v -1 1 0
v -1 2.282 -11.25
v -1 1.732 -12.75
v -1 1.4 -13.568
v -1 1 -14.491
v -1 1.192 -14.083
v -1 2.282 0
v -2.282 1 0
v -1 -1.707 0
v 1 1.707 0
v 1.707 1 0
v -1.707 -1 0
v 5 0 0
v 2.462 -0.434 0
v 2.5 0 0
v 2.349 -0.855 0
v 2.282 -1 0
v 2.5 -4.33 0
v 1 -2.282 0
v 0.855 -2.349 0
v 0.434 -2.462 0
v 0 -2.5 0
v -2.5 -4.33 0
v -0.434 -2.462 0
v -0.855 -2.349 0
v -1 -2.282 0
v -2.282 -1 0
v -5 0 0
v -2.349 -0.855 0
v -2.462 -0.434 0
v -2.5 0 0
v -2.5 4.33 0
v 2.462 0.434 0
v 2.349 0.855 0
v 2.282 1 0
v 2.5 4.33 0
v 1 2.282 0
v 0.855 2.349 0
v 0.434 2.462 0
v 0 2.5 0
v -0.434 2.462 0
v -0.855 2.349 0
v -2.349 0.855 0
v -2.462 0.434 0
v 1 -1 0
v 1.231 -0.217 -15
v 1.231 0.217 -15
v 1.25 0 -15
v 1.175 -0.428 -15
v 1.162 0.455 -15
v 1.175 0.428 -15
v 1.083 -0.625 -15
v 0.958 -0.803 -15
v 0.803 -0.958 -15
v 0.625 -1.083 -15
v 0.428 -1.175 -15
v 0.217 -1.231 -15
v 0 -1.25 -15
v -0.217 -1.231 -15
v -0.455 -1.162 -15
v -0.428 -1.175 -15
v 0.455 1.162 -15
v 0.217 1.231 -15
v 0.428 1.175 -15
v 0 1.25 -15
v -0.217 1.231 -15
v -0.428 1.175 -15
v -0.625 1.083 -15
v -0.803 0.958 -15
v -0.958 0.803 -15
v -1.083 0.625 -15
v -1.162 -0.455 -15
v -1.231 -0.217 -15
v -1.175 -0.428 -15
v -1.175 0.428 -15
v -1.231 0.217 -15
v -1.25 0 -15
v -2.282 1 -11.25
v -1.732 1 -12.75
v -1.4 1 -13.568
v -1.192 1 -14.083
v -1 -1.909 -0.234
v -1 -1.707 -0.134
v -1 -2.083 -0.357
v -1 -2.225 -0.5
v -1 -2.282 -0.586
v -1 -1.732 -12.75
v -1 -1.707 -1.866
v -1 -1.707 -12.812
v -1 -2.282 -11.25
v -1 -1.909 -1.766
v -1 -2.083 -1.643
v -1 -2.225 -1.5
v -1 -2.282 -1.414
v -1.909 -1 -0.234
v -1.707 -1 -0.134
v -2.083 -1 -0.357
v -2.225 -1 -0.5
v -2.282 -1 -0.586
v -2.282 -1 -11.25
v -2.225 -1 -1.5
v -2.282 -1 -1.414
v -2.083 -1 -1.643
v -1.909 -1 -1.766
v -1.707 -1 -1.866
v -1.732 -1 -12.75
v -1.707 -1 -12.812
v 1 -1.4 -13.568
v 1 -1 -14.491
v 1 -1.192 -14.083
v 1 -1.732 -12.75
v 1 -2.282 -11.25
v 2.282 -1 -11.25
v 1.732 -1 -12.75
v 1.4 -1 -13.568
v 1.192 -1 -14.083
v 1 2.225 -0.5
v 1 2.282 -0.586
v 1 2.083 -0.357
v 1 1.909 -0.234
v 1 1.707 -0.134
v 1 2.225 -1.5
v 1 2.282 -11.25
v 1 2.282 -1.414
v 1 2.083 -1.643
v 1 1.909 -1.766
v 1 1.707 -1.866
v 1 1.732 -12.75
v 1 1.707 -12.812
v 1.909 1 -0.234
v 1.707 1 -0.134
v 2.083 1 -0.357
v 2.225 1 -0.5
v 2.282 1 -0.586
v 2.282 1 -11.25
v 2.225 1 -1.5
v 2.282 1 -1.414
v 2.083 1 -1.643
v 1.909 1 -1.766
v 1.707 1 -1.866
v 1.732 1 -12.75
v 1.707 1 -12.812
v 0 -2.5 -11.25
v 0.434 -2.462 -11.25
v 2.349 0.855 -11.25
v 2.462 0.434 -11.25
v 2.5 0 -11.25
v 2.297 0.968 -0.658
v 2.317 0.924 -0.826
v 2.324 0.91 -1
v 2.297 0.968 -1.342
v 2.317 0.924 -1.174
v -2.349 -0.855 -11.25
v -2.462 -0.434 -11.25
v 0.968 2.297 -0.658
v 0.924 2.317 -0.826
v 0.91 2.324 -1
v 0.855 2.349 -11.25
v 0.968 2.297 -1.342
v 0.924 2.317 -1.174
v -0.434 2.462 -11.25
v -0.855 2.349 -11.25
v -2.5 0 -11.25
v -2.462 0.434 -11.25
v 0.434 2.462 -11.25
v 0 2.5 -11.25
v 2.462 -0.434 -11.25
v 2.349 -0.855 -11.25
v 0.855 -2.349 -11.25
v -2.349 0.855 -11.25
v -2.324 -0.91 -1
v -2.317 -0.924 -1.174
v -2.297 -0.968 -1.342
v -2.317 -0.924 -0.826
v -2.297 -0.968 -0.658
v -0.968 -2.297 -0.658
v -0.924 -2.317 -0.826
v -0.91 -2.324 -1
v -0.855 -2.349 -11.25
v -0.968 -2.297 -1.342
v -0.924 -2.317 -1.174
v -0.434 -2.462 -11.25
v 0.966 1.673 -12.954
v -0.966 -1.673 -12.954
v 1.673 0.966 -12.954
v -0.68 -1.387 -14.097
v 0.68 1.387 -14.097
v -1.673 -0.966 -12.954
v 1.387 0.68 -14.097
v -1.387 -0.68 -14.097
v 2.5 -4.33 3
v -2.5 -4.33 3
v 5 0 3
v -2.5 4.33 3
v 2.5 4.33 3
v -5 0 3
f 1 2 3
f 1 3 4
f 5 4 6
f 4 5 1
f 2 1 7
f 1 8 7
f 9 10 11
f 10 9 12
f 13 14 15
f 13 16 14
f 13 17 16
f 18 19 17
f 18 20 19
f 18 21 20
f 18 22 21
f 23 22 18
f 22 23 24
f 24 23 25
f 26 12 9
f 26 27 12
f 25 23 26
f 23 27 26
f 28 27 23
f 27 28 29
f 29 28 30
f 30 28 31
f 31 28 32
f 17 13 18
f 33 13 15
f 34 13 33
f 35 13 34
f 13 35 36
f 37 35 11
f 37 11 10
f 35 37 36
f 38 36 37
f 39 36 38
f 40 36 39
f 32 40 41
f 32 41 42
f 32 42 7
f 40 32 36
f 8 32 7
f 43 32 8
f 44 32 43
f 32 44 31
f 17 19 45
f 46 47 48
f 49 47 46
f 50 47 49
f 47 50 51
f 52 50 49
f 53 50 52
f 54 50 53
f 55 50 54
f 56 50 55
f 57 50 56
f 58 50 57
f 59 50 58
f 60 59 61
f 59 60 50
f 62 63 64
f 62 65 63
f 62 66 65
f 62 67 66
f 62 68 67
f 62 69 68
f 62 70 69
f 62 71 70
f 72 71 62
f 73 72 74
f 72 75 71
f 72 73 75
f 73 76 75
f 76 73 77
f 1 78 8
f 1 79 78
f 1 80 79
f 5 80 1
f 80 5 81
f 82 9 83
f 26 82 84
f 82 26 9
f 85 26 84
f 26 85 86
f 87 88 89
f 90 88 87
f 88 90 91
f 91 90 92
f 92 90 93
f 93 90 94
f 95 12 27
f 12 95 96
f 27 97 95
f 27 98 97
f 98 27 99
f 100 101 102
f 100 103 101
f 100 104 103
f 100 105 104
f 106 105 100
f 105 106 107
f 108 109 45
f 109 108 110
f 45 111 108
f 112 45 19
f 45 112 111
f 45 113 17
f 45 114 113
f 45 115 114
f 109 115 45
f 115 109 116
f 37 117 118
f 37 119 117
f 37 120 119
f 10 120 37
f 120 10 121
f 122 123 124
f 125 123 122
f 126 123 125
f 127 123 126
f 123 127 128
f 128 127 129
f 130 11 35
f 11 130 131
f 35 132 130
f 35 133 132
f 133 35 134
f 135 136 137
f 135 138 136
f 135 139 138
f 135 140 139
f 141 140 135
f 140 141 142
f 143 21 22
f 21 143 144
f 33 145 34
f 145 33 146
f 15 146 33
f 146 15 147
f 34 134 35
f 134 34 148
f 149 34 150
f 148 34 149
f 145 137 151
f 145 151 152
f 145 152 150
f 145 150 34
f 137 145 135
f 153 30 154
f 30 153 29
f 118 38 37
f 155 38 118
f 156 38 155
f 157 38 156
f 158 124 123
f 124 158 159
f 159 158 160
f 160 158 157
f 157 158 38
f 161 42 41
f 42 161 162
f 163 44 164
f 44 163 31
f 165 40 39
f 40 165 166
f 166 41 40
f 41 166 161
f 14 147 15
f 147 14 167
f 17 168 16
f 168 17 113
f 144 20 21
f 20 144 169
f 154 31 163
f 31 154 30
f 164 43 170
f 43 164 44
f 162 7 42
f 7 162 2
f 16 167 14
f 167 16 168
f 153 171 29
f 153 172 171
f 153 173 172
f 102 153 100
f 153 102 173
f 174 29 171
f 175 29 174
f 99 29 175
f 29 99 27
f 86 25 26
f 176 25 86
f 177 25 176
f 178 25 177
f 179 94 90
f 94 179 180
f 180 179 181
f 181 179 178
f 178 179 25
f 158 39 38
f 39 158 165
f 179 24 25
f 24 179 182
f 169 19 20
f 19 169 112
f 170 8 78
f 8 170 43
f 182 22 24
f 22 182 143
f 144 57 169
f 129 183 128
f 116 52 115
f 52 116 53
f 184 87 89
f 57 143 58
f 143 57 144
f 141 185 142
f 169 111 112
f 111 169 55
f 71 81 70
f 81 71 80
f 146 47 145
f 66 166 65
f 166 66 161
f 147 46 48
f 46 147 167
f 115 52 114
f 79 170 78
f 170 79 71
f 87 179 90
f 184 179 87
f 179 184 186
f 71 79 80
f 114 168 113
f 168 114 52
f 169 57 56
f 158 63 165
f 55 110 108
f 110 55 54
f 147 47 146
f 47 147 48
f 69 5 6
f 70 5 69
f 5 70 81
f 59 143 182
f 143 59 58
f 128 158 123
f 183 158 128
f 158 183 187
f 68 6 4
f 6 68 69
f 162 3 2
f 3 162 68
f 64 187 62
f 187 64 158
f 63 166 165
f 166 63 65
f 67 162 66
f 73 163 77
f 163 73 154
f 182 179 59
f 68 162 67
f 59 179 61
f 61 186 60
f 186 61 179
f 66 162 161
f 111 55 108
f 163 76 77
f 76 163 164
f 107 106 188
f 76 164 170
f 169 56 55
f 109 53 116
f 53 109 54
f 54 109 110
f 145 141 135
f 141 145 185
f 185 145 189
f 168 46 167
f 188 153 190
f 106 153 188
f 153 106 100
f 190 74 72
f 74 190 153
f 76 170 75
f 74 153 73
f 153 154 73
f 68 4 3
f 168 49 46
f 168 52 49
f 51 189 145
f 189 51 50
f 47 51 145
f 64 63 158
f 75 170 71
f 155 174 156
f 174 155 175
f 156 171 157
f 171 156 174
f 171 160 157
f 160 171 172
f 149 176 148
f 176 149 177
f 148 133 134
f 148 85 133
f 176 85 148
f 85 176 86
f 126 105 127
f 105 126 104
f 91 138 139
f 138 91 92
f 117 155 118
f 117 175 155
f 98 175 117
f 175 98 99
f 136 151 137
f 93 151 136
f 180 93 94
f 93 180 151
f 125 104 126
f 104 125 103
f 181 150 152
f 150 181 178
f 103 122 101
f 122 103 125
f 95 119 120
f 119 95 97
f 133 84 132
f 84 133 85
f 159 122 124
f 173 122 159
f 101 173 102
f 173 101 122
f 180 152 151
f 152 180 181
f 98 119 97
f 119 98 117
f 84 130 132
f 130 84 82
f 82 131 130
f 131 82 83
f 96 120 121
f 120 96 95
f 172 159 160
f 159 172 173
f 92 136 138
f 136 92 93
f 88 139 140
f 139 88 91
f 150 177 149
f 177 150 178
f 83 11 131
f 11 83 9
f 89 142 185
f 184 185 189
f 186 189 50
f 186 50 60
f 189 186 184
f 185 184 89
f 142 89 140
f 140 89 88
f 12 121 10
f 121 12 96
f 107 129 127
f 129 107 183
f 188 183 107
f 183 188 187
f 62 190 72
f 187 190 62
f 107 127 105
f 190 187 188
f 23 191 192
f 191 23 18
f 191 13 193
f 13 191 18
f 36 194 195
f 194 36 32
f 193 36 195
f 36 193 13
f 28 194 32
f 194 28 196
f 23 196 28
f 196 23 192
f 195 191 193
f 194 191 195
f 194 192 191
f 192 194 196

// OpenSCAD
//CappedPins V2.2
//01 DEC 2020
//By mbrami
//https://www.thingiverse.com/mbrami

/* [ Cap ]*/

// Cap diameter [mm]
Cap_dia =  10;//[0.1:0.1:100]

// Cap height [mm]
Cap_h = 3;//[0.1:0.1:100]

// Cap shape
Cap_shape = "HEXAGON"; // [ROUND SMOOTH, CYLINDER, HEXAGON]

/* [ Pin ]*/

// Pin diameter [mm]
Pin_dia = 5;//[0.1:0.1:100]

// Pin height [mm]
Pin_h = 15;//[0.1:0.1:100]

//Pin orientation [deg]
Pin_rot = 0;//[0:0.1:359.9]

// Pin shape
Pin_shape = "CROSS"; // [ROUND, HEXAGON, CROSS]

//Pin cross width [mm] (only used with CROSS pin shape)
Pin_cross_w = 2;//[0.1:0.1:100]

Pin_cross_w_calc = Pin_cross_w >= Pin_dia/2 ? Pin_dia/2 : Pin_cross_w;

/* [ Pin split ] */

//Pin split
Pin_split = "YES";//[YES, NO]

//Pin split width [mm]
Pin_split_w = 1;//[0:0.1:100]
Pin_split_w_calc = Pin_split_w * 2 <= Pin_dia - 2 ? Pin_split_w : (Pin_dia-2)/2;

//Pin split rotate on z axis [deg]
Pin_split_rot = 90;//[0:0.1:359.9]

/* [ Pin end ] */

//Chamfer pin end
Pin_end_chamfer = "YES";//[YES, NO]

//Chamfer position [% of pin height]
Pin_end_chamfer_position = 0.25;//[0:0.01:1]

//Chamfer minimum diameter [% of pin diameter]
Pin_end_chamfer_min_dia = 0.5;//[0:0.01:1]

/* [ Pin Groove ] */

//Groove
Groove = "NO";//[YES, NO]

//Groove width [mm]
Groove_w= 4;//[0:0.1:100]

//Groove depth [% of Pin diameter]
Groove_d= 0.15;//[0:0.01:1]

//Groove start [% of Pin height]
Groove_start = 0; //[0:0.01:1]

//Groove orientation [deg]
Groove_rot = 0;//[0:0.1:359.9]

//Generators

//Cap generators
module cap_round(smoothed, n_subdiv){
    if (smoothed){
        union(){
            cylinder(h=Cap_h-(Cap_dia/2), d=Cap_dia);  
            intersection(){
                cylinder(h=Cap_h, d=Cap_dia);
                translate([0,0, Cap_h-Cap_dia]) difference(){
                    sphere (Cap_dia, $fn=36);
                    translate([-Cap_dia,-Cap_dia,-Cap_dia*2]) cube(Cap_dia*2);
                    };
                }
            }
        }
    else {
        cylinder(h=Cap_h, d=Cap_dia, $fn=n_subdiv);
        }
};

//Pin Generators
module pin_round(n_subdiv){
    rotate ([0,0,Pin_rot]) translate([0,0,-Pin_h]) cylinder (h=Pin_h, d=Pin_dia, $fn = n_subdiv);
    }
module pin_cross(){
    
    module crossComponent(){
        scale([Pin_dia,Pin_dia,Pin_h]) cube (1);
        }
    difference(){ 
        pin_round(36);
        union(){
            translate([-Pin_dia-(Pin_cross_w/2),Pin_cross_w/2,-Pin_h]) crossComponent() ;
            translate([-Pin_dia-(Pin_cross_w/2),-Pin_dia-Pin_cross_w/2,-Pin_h]) crossComponent() ;
            translate([(Pin_cross_w/2),-Pin_dia-Pin_cross_w/2,-Pin_h]) crossComponent() ;
            translate([Pin_cross_w/2,Pin_cross_w/2,-Pin_h]) crossComponent() ;
            }
        };
}

//Split generator    
module split(){
        rotate([0,0,45])union(){
            translate([0, Pin_dia, -Pin_split_w_calc])rotate([90,0,0]) cylinder (h= Pin_dia*2, d= Pin_split_w_calc*2, $fn=36);
            rotate([0,0,90])translate([-Pin_dia/2, -Pin_split_w_calc/2, -Pin_h])scale([Pin_dia, Pin_split_w_calc, Pin_h])cube (1);
    };
}


module cap(){
    if (Cap_shape=="ROUND SMOOTH"){cap_round(true, 36);}
    else if (Cap_shape=="CYLINDER"){cap_round(false, 36);}
    else if (Cap_shape== "HEXAGON"){cap_round(false, 6);}
}

module pin(){
        if (Pin_shape == "ROUND") {pin_round(36);}
        else if (Pin_shape == "HEXAGON") {pin_round(6);}
        else if (Pin_shape == "CROSS") {pin_cross();};
}

module chamfer(){
    if (Pin_end_chamfer == "YES") {
        difference(){
            pin();
            difference(){    
                translate([0,0,-Pin_h])cylinder(h = Pin_h * Pin_end_chamfer_position, r1 = Pin_dia/2, r2 = Pin_dia/2, $fn=36);
                translate([0,0,-Pin_h])cylinder(h = Pin_h * Pin_end_chamfer_position, r1 = (Pin_dia * Pin_end_chamfer_min_dia)/2, r2 = Pin_dia/2, $fn=36);
            };
        };
    } else {pin();};
}

//Putting all together

difference(){
    union(){
        cap();
        if (Pin_split=="YES") {
            difference (){
                chamfer();        
                rotate([0,0,Pin_split_rot])split();
            }
        } else {chamfer();};
    };
    if (Groove =="YES") {
        rotate(a=Groove_rot, v=[0,0,1])
        translate([Pin_dia/2-(Groove_d*Pin_dia), -Groove_w/2, -Pin_h ])  
        cube(size = [Groove_d * Pin_dia, Groove_w, Pin_h * (1- Groove_start)]);
    } else {
        cube (0);
    };
}
        
